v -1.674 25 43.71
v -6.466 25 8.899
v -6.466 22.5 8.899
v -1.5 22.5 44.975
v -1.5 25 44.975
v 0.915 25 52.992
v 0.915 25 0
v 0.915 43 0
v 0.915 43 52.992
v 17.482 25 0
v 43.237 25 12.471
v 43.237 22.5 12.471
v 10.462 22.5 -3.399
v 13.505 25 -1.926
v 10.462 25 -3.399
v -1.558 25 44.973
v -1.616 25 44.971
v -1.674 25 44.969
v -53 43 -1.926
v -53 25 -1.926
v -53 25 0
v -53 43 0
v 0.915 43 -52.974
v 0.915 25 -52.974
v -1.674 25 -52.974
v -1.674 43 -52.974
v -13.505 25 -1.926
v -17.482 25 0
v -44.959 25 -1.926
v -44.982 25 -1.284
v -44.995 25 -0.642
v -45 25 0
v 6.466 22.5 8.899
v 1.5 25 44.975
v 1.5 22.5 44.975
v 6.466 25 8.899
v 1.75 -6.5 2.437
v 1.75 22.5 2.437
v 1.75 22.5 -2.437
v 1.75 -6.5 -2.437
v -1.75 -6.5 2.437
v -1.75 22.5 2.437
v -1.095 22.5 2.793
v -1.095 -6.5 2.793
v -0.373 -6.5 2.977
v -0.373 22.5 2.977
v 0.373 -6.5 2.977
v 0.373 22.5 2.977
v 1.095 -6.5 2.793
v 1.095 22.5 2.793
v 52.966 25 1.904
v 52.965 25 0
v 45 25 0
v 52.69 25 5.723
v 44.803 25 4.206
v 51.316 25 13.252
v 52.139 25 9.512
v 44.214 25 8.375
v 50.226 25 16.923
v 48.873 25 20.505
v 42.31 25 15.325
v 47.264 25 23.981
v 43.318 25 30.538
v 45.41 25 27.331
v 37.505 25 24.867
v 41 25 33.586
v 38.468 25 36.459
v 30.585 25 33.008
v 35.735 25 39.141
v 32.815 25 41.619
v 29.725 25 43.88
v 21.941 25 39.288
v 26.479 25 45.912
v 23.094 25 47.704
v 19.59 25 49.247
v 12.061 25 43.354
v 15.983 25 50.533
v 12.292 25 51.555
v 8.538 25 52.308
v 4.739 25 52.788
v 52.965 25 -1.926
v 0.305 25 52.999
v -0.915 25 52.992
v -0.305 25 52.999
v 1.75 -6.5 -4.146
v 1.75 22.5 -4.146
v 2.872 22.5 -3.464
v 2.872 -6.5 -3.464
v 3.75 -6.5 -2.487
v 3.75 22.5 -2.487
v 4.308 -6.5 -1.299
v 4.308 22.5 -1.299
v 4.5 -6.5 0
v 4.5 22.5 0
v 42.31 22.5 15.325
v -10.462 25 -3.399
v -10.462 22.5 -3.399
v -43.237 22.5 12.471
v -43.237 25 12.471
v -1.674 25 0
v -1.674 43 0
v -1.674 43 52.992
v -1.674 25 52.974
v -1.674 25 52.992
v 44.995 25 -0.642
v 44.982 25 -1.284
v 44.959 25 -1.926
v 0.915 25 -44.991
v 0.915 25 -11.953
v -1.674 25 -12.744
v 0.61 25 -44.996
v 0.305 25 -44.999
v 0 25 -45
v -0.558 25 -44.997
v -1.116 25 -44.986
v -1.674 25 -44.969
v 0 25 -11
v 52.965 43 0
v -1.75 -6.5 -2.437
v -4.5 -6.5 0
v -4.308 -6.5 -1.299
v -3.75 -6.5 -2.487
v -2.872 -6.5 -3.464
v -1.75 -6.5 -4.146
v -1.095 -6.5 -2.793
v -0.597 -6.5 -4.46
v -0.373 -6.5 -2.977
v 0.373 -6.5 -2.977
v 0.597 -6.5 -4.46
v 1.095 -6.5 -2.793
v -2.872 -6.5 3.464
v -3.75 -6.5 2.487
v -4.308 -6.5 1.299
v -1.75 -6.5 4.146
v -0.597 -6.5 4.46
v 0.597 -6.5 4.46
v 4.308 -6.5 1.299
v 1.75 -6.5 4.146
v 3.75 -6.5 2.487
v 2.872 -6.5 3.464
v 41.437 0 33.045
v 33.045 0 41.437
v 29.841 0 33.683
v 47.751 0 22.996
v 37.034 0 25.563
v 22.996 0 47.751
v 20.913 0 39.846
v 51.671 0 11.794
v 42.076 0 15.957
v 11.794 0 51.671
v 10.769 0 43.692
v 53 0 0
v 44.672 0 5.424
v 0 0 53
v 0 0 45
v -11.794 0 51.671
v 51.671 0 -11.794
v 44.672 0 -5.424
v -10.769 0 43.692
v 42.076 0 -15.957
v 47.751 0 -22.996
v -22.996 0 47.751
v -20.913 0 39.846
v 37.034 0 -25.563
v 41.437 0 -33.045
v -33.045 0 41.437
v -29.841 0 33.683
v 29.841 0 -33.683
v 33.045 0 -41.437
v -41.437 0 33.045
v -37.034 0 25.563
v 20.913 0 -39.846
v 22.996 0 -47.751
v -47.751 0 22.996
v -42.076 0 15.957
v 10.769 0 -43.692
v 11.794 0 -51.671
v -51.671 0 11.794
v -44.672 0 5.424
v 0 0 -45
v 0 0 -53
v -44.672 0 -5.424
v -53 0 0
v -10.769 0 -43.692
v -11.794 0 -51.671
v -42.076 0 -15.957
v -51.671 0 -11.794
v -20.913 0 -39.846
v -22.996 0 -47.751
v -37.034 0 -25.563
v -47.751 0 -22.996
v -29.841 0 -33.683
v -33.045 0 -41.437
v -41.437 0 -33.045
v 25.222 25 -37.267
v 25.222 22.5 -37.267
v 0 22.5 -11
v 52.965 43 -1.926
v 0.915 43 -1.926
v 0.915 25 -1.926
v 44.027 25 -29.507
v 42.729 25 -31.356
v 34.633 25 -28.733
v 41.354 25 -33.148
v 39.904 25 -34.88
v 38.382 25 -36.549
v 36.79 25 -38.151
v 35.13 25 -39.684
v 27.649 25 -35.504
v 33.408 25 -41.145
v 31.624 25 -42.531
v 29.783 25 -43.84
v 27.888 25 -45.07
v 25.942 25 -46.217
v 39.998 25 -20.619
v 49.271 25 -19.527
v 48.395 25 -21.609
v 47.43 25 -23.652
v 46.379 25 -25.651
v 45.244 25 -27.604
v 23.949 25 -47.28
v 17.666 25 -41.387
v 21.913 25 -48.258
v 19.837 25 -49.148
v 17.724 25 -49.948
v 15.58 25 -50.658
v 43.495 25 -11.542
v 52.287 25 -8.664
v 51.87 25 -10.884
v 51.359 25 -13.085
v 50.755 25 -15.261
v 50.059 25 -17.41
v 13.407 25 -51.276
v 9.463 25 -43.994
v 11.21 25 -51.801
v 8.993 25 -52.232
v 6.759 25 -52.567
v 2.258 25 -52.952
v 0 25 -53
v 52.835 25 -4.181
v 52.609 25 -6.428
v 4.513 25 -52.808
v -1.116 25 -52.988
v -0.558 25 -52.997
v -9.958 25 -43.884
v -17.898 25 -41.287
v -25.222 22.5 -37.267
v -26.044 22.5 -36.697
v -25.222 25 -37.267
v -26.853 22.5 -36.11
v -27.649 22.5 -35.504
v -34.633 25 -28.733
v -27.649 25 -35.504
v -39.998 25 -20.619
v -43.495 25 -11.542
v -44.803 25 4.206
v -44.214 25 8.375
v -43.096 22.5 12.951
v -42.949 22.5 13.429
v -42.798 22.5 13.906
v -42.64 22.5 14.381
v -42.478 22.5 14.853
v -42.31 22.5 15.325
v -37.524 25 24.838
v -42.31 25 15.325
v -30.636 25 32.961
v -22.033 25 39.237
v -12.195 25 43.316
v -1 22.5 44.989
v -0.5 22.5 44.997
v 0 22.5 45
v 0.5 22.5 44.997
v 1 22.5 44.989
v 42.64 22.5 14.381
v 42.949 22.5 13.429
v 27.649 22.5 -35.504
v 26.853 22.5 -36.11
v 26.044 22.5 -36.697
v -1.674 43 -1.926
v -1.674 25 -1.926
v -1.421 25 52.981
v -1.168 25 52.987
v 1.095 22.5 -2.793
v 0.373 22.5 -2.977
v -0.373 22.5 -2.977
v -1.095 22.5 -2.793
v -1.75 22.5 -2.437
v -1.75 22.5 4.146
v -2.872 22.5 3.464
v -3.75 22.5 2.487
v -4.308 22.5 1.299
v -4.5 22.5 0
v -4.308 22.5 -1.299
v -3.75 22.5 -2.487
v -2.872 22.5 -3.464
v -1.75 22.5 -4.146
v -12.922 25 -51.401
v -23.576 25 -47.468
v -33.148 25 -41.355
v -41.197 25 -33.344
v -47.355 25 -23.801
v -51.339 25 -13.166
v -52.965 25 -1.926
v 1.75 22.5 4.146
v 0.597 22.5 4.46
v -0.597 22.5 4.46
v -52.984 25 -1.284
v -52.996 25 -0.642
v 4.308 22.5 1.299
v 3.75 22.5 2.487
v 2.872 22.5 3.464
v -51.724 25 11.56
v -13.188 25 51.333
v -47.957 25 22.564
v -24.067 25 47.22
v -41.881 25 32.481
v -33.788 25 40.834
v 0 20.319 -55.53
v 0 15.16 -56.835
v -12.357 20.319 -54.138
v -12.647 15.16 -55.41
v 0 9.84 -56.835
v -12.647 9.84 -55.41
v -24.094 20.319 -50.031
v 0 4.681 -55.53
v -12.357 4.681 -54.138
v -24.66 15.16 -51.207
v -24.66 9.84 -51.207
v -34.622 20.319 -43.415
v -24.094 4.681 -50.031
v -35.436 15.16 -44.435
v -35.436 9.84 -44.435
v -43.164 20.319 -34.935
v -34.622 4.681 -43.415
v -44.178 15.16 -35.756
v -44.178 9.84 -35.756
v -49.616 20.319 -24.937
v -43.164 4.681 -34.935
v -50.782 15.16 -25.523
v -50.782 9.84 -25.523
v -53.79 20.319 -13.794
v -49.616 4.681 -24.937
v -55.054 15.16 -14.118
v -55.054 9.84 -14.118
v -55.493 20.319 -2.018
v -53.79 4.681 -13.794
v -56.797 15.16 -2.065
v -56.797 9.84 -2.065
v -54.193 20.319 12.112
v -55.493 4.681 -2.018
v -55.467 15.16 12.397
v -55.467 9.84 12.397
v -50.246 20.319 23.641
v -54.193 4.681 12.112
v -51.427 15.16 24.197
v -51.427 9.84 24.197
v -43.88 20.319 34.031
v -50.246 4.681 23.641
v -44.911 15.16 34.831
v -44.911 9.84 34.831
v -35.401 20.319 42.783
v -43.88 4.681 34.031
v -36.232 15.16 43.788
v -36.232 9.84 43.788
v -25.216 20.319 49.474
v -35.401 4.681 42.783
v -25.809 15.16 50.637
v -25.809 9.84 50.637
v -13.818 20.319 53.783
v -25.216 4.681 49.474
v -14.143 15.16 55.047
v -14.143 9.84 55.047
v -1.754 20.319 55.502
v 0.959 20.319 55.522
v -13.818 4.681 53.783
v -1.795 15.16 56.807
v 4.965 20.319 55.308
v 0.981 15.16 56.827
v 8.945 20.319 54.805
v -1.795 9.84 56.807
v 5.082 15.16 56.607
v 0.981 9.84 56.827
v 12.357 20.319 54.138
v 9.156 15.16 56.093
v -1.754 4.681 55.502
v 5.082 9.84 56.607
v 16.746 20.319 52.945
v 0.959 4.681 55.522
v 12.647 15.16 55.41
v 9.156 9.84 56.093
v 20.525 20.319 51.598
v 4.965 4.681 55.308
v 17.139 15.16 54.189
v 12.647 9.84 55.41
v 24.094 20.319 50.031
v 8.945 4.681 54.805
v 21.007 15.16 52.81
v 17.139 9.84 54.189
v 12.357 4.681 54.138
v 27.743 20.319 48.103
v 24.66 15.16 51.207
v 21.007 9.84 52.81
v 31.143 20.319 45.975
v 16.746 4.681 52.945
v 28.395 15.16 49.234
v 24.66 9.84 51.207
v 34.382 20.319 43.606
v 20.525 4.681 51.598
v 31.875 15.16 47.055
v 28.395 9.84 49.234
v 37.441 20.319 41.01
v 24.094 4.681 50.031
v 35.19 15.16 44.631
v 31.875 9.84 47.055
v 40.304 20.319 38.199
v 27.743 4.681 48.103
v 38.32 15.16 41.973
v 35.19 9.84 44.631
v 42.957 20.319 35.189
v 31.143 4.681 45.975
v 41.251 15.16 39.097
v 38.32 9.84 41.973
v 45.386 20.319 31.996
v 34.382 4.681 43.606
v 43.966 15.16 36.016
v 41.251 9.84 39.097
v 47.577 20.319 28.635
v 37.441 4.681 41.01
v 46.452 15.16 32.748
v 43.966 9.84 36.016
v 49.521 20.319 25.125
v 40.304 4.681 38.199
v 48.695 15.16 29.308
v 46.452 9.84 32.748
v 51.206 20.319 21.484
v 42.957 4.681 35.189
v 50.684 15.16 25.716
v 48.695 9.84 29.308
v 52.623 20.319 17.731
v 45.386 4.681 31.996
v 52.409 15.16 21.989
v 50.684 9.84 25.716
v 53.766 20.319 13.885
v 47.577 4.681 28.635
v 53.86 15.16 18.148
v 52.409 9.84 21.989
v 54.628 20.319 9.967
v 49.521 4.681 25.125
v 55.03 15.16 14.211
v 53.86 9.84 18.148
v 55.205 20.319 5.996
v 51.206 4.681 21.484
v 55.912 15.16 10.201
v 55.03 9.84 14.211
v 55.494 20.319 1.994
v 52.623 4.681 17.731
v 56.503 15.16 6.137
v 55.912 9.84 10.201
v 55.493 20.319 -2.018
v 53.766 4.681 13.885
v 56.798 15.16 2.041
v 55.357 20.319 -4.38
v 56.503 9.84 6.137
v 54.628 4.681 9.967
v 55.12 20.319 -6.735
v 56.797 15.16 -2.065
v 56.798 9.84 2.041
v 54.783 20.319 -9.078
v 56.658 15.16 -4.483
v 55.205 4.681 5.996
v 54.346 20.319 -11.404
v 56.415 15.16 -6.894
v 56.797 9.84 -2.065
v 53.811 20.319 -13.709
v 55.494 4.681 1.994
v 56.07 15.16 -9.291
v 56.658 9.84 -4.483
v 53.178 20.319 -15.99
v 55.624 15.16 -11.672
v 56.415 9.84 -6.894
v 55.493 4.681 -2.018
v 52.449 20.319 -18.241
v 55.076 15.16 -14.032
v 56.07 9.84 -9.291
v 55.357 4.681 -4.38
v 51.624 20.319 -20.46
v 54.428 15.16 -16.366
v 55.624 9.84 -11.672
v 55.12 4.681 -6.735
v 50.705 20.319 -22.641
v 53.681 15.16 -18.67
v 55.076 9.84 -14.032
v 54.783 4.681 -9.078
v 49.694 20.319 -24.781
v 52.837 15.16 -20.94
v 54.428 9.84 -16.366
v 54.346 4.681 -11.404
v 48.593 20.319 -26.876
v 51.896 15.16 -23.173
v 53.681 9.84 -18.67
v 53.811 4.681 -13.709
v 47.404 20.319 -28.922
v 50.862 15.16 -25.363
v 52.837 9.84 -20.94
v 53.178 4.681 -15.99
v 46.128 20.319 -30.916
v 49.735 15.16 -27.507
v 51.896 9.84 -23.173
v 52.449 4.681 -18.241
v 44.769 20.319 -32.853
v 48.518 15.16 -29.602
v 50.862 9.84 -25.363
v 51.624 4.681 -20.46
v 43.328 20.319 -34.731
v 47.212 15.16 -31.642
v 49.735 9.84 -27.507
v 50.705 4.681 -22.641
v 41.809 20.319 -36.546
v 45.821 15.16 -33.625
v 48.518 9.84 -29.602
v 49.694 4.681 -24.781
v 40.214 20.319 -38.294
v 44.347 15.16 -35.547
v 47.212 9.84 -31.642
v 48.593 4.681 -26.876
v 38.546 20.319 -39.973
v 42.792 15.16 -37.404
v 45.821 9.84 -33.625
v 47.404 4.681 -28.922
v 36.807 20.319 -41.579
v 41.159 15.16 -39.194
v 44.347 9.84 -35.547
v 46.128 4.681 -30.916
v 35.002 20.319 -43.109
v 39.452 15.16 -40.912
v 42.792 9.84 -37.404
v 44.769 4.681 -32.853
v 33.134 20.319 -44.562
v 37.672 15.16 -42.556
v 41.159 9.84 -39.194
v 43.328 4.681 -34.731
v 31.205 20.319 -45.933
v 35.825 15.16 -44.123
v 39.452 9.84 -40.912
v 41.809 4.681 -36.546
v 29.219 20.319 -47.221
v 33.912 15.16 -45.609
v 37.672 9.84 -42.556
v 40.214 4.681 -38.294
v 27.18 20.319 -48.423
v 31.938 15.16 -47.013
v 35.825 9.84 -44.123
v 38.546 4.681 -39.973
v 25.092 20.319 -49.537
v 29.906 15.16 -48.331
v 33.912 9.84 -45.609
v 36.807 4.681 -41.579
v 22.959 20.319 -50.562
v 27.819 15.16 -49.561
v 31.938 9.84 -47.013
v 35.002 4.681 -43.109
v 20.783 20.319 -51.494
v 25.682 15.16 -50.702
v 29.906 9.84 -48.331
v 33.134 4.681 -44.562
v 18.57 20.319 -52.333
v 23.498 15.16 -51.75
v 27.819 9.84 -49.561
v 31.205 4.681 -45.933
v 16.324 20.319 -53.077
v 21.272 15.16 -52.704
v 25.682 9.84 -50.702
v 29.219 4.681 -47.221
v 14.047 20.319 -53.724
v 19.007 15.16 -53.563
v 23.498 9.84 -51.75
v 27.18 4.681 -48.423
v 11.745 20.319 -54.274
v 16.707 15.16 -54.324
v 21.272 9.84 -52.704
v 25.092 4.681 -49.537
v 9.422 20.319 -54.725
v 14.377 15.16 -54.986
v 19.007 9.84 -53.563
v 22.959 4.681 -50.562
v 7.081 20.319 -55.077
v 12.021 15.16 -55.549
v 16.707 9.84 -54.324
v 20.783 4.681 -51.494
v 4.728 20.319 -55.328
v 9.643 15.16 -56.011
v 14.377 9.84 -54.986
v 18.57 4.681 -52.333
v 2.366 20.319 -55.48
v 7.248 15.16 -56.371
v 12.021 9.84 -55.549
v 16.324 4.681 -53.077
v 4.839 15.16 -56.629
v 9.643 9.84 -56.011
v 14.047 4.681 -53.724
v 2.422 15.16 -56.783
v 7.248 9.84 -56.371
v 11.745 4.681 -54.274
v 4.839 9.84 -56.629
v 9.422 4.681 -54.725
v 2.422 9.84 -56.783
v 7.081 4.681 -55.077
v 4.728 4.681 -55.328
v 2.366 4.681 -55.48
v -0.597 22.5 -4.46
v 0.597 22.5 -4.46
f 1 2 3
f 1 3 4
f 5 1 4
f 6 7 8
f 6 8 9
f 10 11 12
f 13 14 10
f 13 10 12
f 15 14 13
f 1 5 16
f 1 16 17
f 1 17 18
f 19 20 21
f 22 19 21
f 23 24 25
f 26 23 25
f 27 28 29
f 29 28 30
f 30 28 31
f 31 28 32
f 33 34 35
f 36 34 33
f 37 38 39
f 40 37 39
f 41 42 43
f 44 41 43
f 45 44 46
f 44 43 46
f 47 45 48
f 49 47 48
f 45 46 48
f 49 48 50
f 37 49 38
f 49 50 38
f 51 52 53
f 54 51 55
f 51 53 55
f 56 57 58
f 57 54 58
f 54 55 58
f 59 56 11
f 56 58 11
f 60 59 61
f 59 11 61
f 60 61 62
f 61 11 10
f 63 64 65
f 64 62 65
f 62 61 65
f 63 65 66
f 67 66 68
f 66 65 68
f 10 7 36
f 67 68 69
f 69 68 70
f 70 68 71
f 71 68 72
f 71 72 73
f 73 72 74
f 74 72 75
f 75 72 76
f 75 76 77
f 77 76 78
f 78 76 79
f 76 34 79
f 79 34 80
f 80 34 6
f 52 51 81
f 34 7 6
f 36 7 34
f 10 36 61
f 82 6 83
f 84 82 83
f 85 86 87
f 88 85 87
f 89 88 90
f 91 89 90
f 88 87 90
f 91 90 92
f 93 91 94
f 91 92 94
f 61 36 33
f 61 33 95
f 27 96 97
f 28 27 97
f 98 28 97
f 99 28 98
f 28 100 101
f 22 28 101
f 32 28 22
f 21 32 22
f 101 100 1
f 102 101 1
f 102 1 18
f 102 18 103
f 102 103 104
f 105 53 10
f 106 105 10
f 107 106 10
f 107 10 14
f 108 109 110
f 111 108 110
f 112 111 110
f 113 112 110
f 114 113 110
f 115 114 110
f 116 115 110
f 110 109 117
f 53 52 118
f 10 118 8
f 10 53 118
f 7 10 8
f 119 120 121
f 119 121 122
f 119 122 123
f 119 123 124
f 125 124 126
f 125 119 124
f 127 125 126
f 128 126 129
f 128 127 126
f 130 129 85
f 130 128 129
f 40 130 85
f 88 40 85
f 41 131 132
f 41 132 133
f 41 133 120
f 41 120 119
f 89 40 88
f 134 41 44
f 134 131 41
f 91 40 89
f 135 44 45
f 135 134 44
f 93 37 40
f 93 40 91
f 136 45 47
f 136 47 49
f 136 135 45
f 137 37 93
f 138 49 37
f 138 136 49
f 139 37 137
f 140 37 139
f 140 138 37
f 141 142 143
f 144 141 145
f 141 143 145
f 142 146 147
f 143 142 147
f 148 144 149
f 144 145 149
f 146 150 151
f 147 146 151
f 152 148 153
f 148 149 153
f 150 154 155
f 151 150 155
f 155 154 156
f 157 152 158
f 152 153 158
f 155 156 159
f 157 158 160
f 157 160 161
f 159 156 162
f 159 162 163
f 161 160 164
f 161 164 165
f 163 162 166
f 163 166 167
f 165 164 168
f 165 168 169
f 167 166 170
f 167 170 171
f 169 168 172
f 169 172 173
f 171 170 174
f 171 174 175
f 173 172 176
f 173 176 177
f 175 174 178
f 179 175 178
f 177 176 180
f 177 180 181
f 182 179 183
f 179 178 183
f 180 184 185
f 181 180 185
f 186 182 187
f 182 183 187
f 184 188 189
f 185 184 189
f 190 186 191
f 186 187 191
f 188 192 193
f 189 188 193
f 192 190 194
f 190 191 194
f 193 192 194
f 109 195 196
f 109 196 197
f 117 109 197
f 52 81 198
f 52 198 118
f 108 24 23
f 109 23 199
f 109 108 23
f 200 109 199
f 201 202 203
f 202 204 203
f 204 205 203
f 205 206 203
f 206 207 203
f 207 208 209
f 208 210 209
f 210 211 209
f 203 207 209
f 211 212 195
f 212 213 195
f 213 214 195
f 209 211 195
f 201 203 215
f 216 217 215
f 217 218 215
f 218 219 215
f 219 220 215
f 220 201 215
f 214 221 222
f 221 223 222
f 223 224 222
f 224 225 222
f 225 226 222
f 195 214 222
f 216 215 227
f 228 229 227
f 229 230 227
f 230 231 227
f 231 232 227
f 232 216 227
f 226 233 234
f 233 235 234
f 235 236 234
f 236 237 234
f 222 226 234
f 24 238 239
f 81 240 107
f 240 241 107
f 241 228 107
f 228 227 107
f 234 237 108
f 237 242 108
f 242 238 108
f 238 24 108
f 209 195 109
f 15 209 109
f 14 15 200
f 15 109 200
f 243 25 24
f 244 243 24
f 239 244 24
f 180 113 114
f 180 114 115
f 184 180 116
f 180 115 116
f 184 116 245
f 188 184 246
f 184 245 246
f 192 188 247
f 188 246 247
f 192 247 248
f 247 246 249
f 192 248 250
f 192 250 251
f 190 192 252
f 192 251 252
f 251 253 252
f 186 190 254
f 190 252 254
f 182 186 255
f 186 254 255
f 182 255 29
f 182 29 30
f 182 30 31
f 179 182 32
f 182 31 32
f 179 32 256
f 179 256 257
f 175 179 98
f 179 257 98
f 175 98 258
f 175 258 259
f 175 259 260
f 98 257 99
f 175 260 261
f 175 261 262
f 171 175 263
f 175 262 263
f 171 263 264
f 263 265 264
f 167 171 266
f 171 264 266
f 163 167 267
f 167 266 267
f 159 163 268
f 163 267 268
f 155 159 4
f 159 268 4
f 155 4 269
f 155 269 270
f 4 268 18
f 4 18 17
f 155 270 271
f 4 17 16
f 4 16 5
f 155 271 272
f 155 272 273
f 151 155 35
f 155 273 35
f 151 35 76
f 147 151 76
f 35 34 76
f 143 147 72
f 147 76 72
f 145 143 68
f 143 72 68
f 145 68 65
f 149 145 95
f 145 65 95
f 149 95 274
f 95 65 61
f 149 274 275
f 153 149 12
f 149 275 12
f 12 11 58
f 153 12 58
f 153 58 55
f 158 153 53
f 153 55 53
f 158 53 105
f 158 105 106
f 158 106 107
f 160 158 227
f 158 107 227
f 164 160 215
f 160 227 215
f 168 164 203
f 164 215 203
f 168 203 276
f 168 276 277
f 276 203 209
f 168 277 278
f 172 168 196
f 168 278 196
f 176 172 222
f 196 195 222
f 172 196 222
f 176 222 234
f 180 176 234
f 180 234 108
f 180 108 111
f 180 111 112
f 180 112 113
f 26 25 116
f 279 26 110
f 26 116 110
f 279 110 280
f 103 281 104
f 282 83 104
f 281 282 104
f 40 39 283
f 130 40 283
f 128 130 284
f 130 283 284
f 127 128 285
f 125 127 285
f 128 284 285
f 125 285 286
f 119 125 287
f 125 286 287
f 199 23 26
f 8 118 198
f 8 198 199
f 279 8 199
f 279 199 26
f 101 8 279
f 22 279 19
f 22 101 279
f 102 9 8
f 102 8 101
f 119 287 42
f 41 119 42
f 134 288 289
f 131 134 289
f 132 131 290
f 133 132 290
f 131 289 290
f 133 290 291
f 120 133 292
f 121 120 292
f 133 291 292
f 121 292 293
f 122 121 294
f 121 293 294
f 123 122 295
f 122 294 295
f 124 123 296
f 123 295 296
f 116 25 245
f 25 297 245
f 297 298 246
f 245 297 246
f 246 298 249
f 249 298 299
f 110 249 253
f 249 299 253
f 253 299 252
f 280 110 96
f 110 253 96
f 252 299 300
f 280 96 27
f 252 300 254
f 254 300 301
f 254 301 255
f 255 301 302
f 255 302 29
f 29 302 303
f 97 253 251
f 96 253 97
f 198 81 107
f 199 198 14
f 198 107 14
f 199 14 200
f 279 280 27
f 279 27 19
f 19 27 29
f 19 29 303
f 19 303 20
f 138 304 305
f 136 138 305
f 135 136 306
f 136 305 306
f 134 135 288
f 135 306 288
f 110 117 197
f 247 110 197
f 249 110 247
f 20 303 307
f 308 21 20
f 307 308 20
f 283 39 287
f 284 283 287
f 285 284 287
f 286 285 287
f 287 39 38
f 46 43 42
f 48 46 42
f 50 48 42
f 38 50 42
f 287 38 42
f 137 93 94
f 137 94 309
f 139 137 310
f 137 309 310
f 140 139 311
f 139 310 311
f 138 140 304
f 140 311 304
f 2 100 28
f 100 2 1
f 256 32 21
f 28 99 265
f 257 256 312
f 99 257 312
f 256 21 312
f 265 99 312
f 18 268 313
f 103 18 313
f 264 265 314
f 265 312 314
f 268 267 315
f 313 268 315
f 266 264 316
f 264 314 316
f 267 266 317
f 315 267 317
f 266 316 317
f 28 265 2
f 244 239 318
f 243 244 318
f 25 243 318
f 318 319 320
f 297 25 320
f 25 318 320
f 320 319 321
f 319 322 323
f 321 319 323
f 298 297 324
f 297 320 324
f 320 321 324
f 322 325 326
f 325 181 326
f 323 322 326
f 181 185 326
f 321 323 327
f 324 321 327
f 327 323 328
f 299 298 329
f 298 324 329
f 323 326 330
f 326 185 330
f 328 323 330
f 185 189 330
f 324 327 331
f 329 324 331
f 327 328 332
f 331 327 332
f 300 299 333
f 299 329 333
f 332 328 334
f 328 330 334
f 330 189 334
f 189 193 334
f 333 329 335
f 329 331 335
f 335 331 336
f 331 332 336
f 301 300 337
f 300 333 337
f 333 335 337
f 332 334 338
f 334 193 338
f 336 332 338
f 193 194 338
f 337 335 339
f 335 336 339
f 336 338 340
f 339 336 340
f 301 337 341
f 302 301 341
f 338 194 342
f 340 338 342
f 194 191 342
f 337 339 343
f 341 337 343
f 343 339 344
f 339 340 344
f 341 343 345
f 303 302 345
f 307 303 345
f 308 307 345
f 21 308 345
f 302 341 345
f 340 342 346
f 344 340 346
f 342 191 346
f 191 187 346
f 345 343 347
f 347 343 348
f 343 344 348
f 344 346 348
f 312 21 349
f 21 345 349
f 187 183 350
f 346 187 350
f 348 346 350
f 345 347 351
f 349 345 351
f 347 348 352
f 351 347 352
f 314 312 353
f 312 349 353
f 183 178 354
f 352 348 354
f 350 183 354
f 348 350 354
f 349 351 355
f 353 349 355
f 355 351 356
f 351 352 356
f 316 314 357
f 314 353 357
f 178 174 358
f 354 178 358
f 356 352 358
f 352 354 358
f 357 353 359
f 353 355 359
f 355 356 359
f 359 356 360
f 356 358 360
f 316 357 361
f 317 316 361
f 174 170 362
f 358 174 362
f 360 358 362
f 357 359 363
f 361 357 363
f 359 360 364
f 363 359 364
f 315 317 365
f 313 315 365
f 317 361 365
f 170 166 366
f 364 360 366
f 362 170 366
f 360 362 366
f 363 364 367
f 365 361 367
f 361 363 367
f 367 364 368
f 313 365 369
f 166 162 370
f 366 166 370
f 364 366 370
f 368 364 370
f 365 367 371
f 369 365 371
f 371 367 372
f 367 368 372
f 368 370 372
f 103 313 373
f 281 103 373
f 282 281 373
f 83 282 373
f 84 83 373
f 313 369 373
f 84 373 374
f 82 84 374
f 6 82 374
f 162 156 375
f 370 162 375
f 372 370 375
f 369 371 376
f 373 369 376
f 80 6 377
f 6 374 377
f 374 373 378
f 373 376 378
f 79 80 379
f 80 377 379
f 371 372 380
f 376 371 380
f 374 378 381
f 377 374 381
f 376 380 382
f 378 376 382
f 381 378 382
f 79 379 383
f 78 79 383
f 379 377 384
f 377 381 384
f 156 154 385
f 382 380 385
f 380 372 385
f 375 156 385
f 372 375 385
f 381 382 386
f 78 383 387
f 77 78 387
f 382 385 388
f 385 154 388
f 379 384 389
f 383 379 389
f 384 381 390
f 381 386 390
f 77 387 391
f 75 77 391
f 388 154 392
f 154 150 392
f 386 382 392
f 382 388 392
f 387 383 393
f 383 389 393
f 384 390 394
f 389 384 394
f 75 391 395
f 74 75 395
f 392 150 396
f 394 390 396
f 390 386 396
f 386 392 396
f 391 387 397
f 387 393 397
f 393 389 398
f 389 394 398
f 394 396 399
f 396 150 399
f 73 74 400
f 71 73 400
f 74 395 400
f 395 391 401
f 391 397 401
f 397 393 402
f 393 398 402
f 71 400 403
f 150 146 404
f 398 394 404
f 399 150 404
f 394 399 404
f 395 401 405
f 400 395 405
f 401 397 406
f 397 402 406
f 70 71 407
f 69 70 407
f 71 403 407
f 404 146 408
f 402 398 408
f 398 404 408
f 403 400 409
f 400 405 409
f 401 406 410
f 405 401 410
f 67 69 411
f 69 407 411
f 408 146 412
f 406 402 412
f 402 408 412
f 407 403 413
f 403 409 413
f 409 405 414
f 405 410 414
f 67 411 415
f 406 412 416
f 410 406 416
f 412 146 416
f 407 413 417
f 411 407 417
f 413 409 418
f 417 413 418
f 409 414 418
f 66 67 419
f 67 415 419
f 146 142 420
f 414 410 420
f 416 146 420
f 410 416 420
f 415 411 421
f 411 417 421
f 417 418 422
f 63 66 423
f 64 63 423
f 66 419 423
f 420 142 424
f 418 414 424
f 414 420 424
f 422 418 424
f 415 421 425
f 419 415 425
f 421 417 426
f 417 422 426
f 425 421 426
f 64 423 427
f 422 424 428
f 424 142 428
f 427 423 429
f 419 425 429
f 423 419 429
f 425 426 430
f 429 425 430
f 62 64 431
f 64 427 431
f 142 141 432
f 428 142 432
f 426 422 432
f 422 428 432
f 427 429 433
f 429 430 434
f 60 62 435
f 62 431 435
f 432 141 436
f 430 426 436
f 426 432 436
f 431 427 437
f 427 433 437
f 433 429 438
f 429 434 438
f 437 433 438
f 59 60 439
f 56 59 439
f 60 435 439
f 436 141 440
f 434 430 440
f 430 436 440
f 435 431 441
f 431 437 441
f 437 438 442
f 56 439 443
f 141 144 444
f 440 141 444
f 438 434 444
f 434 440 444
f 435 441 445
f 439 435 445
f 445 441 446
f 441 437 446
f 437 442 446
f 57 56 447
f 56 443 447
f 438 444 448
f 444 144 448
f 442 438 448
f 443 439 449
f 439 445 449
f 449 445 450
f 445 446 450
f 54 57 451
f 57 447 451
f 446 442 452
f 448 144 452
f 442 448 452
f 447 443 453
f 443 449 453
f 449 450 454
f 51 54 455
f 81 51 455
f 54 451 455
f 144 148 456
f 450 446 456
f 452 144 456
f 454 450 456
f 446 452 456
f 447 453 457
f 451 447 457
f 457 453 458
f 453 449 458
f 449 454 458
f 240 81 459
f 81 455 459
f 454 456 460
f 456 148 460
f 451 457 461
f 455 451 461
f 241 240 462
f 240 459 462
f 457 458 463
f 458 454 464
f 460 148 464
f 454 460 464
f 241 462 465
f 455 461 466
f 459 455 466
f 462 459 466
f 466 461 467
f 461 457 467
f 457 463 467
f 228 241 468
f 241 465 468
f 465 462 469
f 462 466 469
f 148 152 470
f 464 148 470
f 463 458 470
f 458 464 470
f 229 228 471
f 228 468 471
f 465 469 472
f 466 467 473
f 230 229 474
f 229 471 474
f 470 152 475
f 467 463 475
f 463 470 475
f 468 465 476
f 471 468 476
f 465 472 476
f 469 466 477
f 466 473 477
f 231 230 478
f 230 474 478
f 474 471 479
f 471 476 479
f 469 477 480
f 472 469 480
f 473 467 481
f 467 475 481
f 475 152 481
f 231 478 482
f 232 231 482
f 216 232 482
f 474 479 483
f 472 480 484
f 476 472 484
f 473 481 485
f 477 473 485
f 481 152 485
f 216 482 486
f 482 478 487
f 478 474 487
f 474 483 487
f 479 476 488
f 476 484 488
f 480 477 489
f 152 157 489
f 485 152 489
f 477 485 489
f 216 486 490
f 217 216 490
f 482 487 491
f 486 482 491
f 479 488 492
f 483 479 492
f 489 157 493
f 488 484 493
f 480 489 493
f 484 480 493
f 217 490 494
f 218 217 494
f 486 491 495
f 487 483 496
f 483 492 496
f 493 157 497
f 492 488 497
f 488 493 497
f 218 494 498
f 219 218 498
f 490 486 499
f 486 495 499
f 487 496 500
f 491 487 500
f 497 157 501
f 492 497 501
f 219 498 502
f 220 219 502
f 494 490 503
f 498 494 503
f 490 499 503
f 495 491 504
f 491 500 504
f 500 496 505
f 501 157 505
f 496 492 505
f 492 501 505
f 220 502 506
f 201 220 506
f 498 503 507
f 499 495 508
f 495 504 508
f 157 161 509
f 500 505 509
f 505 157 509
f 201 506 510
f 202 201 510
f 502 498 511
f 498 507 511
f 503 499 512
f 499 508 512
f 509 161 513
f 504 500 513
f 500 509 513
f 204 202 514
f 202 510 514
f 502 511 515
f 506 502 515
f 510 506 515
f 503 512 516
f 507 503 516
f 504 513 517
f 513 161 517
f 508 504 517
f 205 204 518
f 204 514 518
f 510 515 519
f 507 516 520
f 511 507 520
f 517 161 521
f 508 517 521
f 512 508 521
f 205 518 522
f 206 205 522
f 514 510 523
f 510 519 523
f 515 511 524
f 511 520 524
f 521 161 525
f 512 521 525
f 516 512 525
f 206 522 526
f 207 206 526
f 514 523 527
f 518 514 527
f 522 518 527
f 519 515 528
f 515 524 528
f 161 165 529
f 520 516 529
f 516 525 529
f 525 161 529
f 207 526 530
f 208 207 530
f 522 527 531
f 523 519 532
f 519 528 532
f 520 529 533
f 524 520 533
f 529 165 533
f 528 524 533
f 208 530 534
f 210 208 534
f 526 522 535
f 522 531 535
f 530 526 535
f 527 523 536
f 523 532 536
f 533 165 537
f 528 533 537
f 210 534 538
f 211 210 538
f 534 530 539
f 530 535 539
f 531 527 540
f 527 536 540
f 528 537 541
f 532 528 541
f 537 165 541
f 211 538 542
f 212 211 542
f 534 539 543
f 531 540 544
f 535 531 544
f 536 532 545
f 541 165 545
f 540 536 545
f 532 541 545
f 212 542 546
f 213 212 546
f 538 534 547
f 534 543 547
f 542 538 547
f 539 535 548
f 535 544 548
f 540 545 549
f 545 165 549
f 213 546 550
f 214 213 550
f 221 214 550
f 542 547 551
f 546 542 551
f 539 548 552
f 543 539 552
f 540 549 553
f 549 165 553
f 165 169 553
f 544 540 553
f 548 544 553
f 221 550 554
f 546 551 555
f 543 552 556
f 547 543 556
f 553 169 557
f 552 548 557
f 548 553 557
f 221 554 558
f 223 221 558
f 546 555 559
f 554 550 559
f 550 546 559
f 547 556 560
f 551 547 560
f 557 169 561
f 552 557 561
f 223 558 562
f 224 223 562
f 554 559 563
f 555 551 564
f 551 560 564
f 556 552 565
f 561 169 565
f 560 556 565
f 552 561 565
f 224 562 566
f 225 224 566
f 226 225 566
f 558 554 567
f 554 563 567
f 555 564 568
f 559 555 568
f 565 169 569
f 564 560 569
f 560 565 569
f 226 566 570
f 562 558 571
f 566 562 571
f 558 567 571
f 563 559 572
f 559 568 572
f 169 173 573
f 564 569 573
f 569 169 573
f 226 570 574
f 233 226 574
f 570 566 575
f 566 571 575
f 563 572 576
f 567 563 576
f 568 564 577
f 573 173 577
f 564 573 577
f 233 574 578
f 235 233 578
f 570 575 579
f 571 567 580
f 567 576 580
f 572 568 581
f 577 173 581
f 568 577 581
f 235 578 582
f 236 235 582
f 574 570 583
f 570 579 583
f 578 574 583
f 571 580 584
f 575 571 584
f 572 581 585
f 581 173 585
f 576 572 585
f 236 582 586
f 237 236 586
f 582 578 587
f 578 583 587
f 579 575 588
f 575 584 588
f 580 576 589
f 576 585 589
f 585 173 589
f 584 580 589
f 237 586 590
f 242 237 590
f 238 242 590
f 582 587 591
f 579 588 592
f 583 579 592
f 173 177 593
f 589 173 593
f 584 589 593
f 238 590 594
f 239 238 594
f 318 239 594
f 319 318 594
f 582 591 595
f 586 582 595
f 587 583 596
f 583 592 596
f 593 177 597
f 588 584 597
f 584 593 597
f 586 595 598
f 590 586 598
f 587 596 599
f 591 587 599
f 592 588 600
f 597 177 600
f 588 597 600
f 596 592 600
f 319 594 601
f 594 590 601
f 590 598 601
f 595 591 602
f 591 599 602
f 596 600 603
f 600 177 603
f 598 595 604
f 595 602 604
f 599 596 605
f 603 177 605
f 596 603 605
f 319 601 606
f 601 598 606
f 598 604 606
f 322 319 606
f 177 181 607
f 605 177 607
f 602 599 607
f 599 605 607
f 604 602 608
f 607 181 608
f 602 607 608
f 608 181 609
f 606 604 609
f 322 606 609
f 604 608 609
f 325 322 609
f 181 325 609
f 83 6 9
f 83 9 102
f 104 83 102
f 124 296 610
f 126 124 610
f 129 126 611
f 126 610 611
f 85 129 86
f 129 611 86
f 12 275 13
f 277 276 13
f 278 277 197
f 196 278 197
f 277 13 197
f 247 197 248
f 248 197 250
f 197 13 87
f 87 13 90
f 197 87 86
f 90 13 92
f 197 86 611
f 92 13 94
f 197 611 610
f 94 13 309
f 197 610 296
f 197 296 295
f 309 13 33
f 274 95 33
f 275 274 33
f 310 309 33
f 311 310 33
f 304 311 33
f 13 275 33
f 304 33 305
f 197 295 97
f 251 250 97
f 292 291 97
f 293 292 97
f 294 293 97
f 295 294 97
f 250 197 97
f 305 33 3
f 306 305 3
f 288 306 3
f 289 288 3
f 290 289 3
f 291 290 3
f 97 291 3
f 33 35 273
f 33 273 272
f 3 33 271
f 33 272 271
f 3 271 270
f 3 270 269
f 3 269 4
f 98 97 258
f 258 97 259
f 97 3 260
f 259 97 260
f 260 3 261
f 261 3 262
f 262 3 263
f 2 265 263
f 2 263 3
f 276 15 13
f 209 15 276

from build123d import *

# Parameters (mm, degrees)
BOSS_EXTRUDE3_DEPTH = 2.5
BOSS_EXTRUDE4_DEPTH = 29
SKETCH4_W           = 2.589054973
SKETCH4_H           = 105.965654802
SKETCH4_W_2         = 105.965002317
SKETCH4_H_2         = 1.925754282
BOSS_EXTRUDE5_DEPTH = 18


with BuildPart() as part:
    # Sketch1 → Revolve1 (revolve)
    with BuildSketch(Plane.YZ, mode=Mode.PRIVATE) as revolve1_sk:
        with BuildLine():
            Line((0, 45), (25, 45))
            Line((25, 45), (25, 53))
            ThreePointArc((25, 53), (12.5, 57), (0, 53))
            Line((0, 53), (0, 45))
        make_face()
    revolve(revolve1_sk.sketch.rotate(Axis((0, 0, 0), (0, 1, 0)), 180), axis=Axis((0, 0, 0), (0, 1, 0)))

    # Sketch2 → Boss-Extrude3 (add)
    with BuildSketch(Plane(origin=(0, 25, 0), x_dir=(-1, 0, 0), z_dir=(0, 1, 0))):
        with BuildLine():
            Line((42.797543233, 13.905764747), (0, 0))
            Line((0, 0), (0, 44.974993052))
            Line((0, 44.974993052), (0, 45))
            ThreePointArc((0, 45), (-0.750104217, 44.993747829), (-1.5, 44.974993052))
            Line((-1.5, 44.974993052), (-6.465637775, 8.899186938))
            Line((-6.465637775, 8.899186938), (-42.310234721, 15.324621949))
            ThreePointArc((-42.310234721, 15.324621949), (-42.797543233, 13.905764747), (-43.237285704, 12.4714524))
            Line((-43.237285704, 12.4714524), (-10.461621679, -3.399186938))
            Line((-10.461621679, -3.399186938), (-27.649163129, -35.503855822))
            ThreePointArc((-27.649163129, -35.503855822), (-26.450336353, -36.405764747), (-25.222112146, -37.267211579))
            Line((-25.222112146, -37.267211579), (0, -11))
            Line((0, -11), (25.222112146, -37.267211579))
            ThreePointArc((25.222112146, -37.267211579), (26.450336353, -36.405764747), (27.649163129, -35.503855822))
            Line((27.649163129, -35.503855822), (10.461621679, -3.399186938))
            Line((10.461621679, -3.399186938), (43.237285704, 12.4714524))
            ThreePointArc((43.237285704, 12.4714524), (43.023392016, 13.190441216), (42.797543233, 13.905764747))
        make_face()
        with BuildLine():
            Line((6.465637775, 8.899186938), (0, 0))
            Line((0, 0), (42.797543233, 13.905764747))
            ThreePointArc((42.797543233, 13.905764747), (42.559802114, 14.617224223), (42.310234721, 15.324621949))
            Line((42.310234721, 15.324621949), (6.465637775, 8.899186938))
        make_face()
        Polygon((0, 44.974993052), (0, 0), (6.465637775, 8.899186938), (1.5, 44.974993052), align=None)
        with BuildLine():
            Line((0, 45), (0, 44.974993052))
            Line((0, 44.974993052), (1.5, 44.974993052))
            ThreePointArc((1.5, 44.974993052), (0.750104217, 44.993747829), (0, 45))
        make_face()
    extrude(amount=-BOSS_EXTRUDE3_DEPTH)

    # Sketch3 → Boss-Extrude4 (add)
    with BuildSketch(Plane.XZ.offset(-22.5)):
        with BuildLine():
            Line((1.75, 4.145780988), (1.75, 2.436698586))
            ThreePointArc((1.75, 2.436698586), (2.669269563, 1.369306394), (3, 0))
            ThreePointArc((3, 0), (2.669269563, -1.369306394), (1.75, -2.436698586))
            Line((1.75, -2.436698586), (1.75, -4.145780988))
            ThreePointArc((1.75, -4.145780988), (3.75, -2.487468593), (4.5, 0))
            ThreePointArc((4.5, 0), (3.75, 2.487468593), (1.75, 4.145780988))
        make_face()
        with BuildLine():
            ThreePointArc((3, 0), (2.669269563, 1.369306394), (1.75, 2.436698586))
            Line((1.75, 2.436698586), (1.75, 0))
            Line((1.75, 0), (1.75, -2.436698586))
            ThreePointArc((1.75, -2.436698586), (2.669269563, -1.369306394), (3, 0))
        make_face()
        with BuildLine():
            Line((-1.75, -2.436698586), (-1.75, 0))
            Line((-1.75, 0), (-1.75, 2.436698586))
            ThreePointArc((-1.75, 2.436698586), (-3, 0), (-1.75, -2.436698586))
        make_face()
        with BuildLine():
            ThreePointArc((-1.75, -2.436698586), (-3, 0), (-1.75, 2.436698586))
            Line((-1.75, 2.436698586), (-1.75, 4.145780988))
            ThreePointArc((-1.75, 4.145780988), (-4.5, 0), (-1.75, -4.145780988))
            Line((-1.75, -4.145780988), (-1.75, -2.436698586))
        make_face()
        with BuildLine():
            Line((-1.75, 4.145780988), (-1.75, 2.436698586))
            ThreePointArc((-1.75, 2.436698586), (0, 3), (1.75, 2.436698586))
            Line((1.75, 2.436698586), (1.75, 4.145780988))
            ThreePointArc((1.75, 4.145780988), (0, 4.5), (-1.75, 4.145780988))
        make_face()
        with BuildLine():
            ThreePointArc((1.75, -2.436698586), (0, -3), (-1.75, -2.436698586))
            Line((-1.75, -2.436698586), (-1.75, -4.145780988))
            ThreePointArc((-1.75, -4.145780988), (0, -4.5), (1.75, -4.145780988))
            Line((1.75, -4.145780988), (1.75, -2.436698586))
        make_face()
    extrude(amount=BOSS_EXTRUDE4_DEPTH)

    # Sketch4 → Boss-Extrude5 (add)
    with BuildSketch(Plane(origin=(0, 25, 0), x_dir=(-1, 0, 0), z_dir=(0, 1, 0))):
        with Locations((0.379622384, 0.0092753)):
            Rectangle(SKETCH4_W, SKETCH4_H)
        with Locations((0.017498841, -0.962877141)):
            Rectangle(SKETCH4_W_2, SKETCH4_H_2)
    extrude(amount=BOSS_EXTRUDE5_DEPTH)


solid = part.part
